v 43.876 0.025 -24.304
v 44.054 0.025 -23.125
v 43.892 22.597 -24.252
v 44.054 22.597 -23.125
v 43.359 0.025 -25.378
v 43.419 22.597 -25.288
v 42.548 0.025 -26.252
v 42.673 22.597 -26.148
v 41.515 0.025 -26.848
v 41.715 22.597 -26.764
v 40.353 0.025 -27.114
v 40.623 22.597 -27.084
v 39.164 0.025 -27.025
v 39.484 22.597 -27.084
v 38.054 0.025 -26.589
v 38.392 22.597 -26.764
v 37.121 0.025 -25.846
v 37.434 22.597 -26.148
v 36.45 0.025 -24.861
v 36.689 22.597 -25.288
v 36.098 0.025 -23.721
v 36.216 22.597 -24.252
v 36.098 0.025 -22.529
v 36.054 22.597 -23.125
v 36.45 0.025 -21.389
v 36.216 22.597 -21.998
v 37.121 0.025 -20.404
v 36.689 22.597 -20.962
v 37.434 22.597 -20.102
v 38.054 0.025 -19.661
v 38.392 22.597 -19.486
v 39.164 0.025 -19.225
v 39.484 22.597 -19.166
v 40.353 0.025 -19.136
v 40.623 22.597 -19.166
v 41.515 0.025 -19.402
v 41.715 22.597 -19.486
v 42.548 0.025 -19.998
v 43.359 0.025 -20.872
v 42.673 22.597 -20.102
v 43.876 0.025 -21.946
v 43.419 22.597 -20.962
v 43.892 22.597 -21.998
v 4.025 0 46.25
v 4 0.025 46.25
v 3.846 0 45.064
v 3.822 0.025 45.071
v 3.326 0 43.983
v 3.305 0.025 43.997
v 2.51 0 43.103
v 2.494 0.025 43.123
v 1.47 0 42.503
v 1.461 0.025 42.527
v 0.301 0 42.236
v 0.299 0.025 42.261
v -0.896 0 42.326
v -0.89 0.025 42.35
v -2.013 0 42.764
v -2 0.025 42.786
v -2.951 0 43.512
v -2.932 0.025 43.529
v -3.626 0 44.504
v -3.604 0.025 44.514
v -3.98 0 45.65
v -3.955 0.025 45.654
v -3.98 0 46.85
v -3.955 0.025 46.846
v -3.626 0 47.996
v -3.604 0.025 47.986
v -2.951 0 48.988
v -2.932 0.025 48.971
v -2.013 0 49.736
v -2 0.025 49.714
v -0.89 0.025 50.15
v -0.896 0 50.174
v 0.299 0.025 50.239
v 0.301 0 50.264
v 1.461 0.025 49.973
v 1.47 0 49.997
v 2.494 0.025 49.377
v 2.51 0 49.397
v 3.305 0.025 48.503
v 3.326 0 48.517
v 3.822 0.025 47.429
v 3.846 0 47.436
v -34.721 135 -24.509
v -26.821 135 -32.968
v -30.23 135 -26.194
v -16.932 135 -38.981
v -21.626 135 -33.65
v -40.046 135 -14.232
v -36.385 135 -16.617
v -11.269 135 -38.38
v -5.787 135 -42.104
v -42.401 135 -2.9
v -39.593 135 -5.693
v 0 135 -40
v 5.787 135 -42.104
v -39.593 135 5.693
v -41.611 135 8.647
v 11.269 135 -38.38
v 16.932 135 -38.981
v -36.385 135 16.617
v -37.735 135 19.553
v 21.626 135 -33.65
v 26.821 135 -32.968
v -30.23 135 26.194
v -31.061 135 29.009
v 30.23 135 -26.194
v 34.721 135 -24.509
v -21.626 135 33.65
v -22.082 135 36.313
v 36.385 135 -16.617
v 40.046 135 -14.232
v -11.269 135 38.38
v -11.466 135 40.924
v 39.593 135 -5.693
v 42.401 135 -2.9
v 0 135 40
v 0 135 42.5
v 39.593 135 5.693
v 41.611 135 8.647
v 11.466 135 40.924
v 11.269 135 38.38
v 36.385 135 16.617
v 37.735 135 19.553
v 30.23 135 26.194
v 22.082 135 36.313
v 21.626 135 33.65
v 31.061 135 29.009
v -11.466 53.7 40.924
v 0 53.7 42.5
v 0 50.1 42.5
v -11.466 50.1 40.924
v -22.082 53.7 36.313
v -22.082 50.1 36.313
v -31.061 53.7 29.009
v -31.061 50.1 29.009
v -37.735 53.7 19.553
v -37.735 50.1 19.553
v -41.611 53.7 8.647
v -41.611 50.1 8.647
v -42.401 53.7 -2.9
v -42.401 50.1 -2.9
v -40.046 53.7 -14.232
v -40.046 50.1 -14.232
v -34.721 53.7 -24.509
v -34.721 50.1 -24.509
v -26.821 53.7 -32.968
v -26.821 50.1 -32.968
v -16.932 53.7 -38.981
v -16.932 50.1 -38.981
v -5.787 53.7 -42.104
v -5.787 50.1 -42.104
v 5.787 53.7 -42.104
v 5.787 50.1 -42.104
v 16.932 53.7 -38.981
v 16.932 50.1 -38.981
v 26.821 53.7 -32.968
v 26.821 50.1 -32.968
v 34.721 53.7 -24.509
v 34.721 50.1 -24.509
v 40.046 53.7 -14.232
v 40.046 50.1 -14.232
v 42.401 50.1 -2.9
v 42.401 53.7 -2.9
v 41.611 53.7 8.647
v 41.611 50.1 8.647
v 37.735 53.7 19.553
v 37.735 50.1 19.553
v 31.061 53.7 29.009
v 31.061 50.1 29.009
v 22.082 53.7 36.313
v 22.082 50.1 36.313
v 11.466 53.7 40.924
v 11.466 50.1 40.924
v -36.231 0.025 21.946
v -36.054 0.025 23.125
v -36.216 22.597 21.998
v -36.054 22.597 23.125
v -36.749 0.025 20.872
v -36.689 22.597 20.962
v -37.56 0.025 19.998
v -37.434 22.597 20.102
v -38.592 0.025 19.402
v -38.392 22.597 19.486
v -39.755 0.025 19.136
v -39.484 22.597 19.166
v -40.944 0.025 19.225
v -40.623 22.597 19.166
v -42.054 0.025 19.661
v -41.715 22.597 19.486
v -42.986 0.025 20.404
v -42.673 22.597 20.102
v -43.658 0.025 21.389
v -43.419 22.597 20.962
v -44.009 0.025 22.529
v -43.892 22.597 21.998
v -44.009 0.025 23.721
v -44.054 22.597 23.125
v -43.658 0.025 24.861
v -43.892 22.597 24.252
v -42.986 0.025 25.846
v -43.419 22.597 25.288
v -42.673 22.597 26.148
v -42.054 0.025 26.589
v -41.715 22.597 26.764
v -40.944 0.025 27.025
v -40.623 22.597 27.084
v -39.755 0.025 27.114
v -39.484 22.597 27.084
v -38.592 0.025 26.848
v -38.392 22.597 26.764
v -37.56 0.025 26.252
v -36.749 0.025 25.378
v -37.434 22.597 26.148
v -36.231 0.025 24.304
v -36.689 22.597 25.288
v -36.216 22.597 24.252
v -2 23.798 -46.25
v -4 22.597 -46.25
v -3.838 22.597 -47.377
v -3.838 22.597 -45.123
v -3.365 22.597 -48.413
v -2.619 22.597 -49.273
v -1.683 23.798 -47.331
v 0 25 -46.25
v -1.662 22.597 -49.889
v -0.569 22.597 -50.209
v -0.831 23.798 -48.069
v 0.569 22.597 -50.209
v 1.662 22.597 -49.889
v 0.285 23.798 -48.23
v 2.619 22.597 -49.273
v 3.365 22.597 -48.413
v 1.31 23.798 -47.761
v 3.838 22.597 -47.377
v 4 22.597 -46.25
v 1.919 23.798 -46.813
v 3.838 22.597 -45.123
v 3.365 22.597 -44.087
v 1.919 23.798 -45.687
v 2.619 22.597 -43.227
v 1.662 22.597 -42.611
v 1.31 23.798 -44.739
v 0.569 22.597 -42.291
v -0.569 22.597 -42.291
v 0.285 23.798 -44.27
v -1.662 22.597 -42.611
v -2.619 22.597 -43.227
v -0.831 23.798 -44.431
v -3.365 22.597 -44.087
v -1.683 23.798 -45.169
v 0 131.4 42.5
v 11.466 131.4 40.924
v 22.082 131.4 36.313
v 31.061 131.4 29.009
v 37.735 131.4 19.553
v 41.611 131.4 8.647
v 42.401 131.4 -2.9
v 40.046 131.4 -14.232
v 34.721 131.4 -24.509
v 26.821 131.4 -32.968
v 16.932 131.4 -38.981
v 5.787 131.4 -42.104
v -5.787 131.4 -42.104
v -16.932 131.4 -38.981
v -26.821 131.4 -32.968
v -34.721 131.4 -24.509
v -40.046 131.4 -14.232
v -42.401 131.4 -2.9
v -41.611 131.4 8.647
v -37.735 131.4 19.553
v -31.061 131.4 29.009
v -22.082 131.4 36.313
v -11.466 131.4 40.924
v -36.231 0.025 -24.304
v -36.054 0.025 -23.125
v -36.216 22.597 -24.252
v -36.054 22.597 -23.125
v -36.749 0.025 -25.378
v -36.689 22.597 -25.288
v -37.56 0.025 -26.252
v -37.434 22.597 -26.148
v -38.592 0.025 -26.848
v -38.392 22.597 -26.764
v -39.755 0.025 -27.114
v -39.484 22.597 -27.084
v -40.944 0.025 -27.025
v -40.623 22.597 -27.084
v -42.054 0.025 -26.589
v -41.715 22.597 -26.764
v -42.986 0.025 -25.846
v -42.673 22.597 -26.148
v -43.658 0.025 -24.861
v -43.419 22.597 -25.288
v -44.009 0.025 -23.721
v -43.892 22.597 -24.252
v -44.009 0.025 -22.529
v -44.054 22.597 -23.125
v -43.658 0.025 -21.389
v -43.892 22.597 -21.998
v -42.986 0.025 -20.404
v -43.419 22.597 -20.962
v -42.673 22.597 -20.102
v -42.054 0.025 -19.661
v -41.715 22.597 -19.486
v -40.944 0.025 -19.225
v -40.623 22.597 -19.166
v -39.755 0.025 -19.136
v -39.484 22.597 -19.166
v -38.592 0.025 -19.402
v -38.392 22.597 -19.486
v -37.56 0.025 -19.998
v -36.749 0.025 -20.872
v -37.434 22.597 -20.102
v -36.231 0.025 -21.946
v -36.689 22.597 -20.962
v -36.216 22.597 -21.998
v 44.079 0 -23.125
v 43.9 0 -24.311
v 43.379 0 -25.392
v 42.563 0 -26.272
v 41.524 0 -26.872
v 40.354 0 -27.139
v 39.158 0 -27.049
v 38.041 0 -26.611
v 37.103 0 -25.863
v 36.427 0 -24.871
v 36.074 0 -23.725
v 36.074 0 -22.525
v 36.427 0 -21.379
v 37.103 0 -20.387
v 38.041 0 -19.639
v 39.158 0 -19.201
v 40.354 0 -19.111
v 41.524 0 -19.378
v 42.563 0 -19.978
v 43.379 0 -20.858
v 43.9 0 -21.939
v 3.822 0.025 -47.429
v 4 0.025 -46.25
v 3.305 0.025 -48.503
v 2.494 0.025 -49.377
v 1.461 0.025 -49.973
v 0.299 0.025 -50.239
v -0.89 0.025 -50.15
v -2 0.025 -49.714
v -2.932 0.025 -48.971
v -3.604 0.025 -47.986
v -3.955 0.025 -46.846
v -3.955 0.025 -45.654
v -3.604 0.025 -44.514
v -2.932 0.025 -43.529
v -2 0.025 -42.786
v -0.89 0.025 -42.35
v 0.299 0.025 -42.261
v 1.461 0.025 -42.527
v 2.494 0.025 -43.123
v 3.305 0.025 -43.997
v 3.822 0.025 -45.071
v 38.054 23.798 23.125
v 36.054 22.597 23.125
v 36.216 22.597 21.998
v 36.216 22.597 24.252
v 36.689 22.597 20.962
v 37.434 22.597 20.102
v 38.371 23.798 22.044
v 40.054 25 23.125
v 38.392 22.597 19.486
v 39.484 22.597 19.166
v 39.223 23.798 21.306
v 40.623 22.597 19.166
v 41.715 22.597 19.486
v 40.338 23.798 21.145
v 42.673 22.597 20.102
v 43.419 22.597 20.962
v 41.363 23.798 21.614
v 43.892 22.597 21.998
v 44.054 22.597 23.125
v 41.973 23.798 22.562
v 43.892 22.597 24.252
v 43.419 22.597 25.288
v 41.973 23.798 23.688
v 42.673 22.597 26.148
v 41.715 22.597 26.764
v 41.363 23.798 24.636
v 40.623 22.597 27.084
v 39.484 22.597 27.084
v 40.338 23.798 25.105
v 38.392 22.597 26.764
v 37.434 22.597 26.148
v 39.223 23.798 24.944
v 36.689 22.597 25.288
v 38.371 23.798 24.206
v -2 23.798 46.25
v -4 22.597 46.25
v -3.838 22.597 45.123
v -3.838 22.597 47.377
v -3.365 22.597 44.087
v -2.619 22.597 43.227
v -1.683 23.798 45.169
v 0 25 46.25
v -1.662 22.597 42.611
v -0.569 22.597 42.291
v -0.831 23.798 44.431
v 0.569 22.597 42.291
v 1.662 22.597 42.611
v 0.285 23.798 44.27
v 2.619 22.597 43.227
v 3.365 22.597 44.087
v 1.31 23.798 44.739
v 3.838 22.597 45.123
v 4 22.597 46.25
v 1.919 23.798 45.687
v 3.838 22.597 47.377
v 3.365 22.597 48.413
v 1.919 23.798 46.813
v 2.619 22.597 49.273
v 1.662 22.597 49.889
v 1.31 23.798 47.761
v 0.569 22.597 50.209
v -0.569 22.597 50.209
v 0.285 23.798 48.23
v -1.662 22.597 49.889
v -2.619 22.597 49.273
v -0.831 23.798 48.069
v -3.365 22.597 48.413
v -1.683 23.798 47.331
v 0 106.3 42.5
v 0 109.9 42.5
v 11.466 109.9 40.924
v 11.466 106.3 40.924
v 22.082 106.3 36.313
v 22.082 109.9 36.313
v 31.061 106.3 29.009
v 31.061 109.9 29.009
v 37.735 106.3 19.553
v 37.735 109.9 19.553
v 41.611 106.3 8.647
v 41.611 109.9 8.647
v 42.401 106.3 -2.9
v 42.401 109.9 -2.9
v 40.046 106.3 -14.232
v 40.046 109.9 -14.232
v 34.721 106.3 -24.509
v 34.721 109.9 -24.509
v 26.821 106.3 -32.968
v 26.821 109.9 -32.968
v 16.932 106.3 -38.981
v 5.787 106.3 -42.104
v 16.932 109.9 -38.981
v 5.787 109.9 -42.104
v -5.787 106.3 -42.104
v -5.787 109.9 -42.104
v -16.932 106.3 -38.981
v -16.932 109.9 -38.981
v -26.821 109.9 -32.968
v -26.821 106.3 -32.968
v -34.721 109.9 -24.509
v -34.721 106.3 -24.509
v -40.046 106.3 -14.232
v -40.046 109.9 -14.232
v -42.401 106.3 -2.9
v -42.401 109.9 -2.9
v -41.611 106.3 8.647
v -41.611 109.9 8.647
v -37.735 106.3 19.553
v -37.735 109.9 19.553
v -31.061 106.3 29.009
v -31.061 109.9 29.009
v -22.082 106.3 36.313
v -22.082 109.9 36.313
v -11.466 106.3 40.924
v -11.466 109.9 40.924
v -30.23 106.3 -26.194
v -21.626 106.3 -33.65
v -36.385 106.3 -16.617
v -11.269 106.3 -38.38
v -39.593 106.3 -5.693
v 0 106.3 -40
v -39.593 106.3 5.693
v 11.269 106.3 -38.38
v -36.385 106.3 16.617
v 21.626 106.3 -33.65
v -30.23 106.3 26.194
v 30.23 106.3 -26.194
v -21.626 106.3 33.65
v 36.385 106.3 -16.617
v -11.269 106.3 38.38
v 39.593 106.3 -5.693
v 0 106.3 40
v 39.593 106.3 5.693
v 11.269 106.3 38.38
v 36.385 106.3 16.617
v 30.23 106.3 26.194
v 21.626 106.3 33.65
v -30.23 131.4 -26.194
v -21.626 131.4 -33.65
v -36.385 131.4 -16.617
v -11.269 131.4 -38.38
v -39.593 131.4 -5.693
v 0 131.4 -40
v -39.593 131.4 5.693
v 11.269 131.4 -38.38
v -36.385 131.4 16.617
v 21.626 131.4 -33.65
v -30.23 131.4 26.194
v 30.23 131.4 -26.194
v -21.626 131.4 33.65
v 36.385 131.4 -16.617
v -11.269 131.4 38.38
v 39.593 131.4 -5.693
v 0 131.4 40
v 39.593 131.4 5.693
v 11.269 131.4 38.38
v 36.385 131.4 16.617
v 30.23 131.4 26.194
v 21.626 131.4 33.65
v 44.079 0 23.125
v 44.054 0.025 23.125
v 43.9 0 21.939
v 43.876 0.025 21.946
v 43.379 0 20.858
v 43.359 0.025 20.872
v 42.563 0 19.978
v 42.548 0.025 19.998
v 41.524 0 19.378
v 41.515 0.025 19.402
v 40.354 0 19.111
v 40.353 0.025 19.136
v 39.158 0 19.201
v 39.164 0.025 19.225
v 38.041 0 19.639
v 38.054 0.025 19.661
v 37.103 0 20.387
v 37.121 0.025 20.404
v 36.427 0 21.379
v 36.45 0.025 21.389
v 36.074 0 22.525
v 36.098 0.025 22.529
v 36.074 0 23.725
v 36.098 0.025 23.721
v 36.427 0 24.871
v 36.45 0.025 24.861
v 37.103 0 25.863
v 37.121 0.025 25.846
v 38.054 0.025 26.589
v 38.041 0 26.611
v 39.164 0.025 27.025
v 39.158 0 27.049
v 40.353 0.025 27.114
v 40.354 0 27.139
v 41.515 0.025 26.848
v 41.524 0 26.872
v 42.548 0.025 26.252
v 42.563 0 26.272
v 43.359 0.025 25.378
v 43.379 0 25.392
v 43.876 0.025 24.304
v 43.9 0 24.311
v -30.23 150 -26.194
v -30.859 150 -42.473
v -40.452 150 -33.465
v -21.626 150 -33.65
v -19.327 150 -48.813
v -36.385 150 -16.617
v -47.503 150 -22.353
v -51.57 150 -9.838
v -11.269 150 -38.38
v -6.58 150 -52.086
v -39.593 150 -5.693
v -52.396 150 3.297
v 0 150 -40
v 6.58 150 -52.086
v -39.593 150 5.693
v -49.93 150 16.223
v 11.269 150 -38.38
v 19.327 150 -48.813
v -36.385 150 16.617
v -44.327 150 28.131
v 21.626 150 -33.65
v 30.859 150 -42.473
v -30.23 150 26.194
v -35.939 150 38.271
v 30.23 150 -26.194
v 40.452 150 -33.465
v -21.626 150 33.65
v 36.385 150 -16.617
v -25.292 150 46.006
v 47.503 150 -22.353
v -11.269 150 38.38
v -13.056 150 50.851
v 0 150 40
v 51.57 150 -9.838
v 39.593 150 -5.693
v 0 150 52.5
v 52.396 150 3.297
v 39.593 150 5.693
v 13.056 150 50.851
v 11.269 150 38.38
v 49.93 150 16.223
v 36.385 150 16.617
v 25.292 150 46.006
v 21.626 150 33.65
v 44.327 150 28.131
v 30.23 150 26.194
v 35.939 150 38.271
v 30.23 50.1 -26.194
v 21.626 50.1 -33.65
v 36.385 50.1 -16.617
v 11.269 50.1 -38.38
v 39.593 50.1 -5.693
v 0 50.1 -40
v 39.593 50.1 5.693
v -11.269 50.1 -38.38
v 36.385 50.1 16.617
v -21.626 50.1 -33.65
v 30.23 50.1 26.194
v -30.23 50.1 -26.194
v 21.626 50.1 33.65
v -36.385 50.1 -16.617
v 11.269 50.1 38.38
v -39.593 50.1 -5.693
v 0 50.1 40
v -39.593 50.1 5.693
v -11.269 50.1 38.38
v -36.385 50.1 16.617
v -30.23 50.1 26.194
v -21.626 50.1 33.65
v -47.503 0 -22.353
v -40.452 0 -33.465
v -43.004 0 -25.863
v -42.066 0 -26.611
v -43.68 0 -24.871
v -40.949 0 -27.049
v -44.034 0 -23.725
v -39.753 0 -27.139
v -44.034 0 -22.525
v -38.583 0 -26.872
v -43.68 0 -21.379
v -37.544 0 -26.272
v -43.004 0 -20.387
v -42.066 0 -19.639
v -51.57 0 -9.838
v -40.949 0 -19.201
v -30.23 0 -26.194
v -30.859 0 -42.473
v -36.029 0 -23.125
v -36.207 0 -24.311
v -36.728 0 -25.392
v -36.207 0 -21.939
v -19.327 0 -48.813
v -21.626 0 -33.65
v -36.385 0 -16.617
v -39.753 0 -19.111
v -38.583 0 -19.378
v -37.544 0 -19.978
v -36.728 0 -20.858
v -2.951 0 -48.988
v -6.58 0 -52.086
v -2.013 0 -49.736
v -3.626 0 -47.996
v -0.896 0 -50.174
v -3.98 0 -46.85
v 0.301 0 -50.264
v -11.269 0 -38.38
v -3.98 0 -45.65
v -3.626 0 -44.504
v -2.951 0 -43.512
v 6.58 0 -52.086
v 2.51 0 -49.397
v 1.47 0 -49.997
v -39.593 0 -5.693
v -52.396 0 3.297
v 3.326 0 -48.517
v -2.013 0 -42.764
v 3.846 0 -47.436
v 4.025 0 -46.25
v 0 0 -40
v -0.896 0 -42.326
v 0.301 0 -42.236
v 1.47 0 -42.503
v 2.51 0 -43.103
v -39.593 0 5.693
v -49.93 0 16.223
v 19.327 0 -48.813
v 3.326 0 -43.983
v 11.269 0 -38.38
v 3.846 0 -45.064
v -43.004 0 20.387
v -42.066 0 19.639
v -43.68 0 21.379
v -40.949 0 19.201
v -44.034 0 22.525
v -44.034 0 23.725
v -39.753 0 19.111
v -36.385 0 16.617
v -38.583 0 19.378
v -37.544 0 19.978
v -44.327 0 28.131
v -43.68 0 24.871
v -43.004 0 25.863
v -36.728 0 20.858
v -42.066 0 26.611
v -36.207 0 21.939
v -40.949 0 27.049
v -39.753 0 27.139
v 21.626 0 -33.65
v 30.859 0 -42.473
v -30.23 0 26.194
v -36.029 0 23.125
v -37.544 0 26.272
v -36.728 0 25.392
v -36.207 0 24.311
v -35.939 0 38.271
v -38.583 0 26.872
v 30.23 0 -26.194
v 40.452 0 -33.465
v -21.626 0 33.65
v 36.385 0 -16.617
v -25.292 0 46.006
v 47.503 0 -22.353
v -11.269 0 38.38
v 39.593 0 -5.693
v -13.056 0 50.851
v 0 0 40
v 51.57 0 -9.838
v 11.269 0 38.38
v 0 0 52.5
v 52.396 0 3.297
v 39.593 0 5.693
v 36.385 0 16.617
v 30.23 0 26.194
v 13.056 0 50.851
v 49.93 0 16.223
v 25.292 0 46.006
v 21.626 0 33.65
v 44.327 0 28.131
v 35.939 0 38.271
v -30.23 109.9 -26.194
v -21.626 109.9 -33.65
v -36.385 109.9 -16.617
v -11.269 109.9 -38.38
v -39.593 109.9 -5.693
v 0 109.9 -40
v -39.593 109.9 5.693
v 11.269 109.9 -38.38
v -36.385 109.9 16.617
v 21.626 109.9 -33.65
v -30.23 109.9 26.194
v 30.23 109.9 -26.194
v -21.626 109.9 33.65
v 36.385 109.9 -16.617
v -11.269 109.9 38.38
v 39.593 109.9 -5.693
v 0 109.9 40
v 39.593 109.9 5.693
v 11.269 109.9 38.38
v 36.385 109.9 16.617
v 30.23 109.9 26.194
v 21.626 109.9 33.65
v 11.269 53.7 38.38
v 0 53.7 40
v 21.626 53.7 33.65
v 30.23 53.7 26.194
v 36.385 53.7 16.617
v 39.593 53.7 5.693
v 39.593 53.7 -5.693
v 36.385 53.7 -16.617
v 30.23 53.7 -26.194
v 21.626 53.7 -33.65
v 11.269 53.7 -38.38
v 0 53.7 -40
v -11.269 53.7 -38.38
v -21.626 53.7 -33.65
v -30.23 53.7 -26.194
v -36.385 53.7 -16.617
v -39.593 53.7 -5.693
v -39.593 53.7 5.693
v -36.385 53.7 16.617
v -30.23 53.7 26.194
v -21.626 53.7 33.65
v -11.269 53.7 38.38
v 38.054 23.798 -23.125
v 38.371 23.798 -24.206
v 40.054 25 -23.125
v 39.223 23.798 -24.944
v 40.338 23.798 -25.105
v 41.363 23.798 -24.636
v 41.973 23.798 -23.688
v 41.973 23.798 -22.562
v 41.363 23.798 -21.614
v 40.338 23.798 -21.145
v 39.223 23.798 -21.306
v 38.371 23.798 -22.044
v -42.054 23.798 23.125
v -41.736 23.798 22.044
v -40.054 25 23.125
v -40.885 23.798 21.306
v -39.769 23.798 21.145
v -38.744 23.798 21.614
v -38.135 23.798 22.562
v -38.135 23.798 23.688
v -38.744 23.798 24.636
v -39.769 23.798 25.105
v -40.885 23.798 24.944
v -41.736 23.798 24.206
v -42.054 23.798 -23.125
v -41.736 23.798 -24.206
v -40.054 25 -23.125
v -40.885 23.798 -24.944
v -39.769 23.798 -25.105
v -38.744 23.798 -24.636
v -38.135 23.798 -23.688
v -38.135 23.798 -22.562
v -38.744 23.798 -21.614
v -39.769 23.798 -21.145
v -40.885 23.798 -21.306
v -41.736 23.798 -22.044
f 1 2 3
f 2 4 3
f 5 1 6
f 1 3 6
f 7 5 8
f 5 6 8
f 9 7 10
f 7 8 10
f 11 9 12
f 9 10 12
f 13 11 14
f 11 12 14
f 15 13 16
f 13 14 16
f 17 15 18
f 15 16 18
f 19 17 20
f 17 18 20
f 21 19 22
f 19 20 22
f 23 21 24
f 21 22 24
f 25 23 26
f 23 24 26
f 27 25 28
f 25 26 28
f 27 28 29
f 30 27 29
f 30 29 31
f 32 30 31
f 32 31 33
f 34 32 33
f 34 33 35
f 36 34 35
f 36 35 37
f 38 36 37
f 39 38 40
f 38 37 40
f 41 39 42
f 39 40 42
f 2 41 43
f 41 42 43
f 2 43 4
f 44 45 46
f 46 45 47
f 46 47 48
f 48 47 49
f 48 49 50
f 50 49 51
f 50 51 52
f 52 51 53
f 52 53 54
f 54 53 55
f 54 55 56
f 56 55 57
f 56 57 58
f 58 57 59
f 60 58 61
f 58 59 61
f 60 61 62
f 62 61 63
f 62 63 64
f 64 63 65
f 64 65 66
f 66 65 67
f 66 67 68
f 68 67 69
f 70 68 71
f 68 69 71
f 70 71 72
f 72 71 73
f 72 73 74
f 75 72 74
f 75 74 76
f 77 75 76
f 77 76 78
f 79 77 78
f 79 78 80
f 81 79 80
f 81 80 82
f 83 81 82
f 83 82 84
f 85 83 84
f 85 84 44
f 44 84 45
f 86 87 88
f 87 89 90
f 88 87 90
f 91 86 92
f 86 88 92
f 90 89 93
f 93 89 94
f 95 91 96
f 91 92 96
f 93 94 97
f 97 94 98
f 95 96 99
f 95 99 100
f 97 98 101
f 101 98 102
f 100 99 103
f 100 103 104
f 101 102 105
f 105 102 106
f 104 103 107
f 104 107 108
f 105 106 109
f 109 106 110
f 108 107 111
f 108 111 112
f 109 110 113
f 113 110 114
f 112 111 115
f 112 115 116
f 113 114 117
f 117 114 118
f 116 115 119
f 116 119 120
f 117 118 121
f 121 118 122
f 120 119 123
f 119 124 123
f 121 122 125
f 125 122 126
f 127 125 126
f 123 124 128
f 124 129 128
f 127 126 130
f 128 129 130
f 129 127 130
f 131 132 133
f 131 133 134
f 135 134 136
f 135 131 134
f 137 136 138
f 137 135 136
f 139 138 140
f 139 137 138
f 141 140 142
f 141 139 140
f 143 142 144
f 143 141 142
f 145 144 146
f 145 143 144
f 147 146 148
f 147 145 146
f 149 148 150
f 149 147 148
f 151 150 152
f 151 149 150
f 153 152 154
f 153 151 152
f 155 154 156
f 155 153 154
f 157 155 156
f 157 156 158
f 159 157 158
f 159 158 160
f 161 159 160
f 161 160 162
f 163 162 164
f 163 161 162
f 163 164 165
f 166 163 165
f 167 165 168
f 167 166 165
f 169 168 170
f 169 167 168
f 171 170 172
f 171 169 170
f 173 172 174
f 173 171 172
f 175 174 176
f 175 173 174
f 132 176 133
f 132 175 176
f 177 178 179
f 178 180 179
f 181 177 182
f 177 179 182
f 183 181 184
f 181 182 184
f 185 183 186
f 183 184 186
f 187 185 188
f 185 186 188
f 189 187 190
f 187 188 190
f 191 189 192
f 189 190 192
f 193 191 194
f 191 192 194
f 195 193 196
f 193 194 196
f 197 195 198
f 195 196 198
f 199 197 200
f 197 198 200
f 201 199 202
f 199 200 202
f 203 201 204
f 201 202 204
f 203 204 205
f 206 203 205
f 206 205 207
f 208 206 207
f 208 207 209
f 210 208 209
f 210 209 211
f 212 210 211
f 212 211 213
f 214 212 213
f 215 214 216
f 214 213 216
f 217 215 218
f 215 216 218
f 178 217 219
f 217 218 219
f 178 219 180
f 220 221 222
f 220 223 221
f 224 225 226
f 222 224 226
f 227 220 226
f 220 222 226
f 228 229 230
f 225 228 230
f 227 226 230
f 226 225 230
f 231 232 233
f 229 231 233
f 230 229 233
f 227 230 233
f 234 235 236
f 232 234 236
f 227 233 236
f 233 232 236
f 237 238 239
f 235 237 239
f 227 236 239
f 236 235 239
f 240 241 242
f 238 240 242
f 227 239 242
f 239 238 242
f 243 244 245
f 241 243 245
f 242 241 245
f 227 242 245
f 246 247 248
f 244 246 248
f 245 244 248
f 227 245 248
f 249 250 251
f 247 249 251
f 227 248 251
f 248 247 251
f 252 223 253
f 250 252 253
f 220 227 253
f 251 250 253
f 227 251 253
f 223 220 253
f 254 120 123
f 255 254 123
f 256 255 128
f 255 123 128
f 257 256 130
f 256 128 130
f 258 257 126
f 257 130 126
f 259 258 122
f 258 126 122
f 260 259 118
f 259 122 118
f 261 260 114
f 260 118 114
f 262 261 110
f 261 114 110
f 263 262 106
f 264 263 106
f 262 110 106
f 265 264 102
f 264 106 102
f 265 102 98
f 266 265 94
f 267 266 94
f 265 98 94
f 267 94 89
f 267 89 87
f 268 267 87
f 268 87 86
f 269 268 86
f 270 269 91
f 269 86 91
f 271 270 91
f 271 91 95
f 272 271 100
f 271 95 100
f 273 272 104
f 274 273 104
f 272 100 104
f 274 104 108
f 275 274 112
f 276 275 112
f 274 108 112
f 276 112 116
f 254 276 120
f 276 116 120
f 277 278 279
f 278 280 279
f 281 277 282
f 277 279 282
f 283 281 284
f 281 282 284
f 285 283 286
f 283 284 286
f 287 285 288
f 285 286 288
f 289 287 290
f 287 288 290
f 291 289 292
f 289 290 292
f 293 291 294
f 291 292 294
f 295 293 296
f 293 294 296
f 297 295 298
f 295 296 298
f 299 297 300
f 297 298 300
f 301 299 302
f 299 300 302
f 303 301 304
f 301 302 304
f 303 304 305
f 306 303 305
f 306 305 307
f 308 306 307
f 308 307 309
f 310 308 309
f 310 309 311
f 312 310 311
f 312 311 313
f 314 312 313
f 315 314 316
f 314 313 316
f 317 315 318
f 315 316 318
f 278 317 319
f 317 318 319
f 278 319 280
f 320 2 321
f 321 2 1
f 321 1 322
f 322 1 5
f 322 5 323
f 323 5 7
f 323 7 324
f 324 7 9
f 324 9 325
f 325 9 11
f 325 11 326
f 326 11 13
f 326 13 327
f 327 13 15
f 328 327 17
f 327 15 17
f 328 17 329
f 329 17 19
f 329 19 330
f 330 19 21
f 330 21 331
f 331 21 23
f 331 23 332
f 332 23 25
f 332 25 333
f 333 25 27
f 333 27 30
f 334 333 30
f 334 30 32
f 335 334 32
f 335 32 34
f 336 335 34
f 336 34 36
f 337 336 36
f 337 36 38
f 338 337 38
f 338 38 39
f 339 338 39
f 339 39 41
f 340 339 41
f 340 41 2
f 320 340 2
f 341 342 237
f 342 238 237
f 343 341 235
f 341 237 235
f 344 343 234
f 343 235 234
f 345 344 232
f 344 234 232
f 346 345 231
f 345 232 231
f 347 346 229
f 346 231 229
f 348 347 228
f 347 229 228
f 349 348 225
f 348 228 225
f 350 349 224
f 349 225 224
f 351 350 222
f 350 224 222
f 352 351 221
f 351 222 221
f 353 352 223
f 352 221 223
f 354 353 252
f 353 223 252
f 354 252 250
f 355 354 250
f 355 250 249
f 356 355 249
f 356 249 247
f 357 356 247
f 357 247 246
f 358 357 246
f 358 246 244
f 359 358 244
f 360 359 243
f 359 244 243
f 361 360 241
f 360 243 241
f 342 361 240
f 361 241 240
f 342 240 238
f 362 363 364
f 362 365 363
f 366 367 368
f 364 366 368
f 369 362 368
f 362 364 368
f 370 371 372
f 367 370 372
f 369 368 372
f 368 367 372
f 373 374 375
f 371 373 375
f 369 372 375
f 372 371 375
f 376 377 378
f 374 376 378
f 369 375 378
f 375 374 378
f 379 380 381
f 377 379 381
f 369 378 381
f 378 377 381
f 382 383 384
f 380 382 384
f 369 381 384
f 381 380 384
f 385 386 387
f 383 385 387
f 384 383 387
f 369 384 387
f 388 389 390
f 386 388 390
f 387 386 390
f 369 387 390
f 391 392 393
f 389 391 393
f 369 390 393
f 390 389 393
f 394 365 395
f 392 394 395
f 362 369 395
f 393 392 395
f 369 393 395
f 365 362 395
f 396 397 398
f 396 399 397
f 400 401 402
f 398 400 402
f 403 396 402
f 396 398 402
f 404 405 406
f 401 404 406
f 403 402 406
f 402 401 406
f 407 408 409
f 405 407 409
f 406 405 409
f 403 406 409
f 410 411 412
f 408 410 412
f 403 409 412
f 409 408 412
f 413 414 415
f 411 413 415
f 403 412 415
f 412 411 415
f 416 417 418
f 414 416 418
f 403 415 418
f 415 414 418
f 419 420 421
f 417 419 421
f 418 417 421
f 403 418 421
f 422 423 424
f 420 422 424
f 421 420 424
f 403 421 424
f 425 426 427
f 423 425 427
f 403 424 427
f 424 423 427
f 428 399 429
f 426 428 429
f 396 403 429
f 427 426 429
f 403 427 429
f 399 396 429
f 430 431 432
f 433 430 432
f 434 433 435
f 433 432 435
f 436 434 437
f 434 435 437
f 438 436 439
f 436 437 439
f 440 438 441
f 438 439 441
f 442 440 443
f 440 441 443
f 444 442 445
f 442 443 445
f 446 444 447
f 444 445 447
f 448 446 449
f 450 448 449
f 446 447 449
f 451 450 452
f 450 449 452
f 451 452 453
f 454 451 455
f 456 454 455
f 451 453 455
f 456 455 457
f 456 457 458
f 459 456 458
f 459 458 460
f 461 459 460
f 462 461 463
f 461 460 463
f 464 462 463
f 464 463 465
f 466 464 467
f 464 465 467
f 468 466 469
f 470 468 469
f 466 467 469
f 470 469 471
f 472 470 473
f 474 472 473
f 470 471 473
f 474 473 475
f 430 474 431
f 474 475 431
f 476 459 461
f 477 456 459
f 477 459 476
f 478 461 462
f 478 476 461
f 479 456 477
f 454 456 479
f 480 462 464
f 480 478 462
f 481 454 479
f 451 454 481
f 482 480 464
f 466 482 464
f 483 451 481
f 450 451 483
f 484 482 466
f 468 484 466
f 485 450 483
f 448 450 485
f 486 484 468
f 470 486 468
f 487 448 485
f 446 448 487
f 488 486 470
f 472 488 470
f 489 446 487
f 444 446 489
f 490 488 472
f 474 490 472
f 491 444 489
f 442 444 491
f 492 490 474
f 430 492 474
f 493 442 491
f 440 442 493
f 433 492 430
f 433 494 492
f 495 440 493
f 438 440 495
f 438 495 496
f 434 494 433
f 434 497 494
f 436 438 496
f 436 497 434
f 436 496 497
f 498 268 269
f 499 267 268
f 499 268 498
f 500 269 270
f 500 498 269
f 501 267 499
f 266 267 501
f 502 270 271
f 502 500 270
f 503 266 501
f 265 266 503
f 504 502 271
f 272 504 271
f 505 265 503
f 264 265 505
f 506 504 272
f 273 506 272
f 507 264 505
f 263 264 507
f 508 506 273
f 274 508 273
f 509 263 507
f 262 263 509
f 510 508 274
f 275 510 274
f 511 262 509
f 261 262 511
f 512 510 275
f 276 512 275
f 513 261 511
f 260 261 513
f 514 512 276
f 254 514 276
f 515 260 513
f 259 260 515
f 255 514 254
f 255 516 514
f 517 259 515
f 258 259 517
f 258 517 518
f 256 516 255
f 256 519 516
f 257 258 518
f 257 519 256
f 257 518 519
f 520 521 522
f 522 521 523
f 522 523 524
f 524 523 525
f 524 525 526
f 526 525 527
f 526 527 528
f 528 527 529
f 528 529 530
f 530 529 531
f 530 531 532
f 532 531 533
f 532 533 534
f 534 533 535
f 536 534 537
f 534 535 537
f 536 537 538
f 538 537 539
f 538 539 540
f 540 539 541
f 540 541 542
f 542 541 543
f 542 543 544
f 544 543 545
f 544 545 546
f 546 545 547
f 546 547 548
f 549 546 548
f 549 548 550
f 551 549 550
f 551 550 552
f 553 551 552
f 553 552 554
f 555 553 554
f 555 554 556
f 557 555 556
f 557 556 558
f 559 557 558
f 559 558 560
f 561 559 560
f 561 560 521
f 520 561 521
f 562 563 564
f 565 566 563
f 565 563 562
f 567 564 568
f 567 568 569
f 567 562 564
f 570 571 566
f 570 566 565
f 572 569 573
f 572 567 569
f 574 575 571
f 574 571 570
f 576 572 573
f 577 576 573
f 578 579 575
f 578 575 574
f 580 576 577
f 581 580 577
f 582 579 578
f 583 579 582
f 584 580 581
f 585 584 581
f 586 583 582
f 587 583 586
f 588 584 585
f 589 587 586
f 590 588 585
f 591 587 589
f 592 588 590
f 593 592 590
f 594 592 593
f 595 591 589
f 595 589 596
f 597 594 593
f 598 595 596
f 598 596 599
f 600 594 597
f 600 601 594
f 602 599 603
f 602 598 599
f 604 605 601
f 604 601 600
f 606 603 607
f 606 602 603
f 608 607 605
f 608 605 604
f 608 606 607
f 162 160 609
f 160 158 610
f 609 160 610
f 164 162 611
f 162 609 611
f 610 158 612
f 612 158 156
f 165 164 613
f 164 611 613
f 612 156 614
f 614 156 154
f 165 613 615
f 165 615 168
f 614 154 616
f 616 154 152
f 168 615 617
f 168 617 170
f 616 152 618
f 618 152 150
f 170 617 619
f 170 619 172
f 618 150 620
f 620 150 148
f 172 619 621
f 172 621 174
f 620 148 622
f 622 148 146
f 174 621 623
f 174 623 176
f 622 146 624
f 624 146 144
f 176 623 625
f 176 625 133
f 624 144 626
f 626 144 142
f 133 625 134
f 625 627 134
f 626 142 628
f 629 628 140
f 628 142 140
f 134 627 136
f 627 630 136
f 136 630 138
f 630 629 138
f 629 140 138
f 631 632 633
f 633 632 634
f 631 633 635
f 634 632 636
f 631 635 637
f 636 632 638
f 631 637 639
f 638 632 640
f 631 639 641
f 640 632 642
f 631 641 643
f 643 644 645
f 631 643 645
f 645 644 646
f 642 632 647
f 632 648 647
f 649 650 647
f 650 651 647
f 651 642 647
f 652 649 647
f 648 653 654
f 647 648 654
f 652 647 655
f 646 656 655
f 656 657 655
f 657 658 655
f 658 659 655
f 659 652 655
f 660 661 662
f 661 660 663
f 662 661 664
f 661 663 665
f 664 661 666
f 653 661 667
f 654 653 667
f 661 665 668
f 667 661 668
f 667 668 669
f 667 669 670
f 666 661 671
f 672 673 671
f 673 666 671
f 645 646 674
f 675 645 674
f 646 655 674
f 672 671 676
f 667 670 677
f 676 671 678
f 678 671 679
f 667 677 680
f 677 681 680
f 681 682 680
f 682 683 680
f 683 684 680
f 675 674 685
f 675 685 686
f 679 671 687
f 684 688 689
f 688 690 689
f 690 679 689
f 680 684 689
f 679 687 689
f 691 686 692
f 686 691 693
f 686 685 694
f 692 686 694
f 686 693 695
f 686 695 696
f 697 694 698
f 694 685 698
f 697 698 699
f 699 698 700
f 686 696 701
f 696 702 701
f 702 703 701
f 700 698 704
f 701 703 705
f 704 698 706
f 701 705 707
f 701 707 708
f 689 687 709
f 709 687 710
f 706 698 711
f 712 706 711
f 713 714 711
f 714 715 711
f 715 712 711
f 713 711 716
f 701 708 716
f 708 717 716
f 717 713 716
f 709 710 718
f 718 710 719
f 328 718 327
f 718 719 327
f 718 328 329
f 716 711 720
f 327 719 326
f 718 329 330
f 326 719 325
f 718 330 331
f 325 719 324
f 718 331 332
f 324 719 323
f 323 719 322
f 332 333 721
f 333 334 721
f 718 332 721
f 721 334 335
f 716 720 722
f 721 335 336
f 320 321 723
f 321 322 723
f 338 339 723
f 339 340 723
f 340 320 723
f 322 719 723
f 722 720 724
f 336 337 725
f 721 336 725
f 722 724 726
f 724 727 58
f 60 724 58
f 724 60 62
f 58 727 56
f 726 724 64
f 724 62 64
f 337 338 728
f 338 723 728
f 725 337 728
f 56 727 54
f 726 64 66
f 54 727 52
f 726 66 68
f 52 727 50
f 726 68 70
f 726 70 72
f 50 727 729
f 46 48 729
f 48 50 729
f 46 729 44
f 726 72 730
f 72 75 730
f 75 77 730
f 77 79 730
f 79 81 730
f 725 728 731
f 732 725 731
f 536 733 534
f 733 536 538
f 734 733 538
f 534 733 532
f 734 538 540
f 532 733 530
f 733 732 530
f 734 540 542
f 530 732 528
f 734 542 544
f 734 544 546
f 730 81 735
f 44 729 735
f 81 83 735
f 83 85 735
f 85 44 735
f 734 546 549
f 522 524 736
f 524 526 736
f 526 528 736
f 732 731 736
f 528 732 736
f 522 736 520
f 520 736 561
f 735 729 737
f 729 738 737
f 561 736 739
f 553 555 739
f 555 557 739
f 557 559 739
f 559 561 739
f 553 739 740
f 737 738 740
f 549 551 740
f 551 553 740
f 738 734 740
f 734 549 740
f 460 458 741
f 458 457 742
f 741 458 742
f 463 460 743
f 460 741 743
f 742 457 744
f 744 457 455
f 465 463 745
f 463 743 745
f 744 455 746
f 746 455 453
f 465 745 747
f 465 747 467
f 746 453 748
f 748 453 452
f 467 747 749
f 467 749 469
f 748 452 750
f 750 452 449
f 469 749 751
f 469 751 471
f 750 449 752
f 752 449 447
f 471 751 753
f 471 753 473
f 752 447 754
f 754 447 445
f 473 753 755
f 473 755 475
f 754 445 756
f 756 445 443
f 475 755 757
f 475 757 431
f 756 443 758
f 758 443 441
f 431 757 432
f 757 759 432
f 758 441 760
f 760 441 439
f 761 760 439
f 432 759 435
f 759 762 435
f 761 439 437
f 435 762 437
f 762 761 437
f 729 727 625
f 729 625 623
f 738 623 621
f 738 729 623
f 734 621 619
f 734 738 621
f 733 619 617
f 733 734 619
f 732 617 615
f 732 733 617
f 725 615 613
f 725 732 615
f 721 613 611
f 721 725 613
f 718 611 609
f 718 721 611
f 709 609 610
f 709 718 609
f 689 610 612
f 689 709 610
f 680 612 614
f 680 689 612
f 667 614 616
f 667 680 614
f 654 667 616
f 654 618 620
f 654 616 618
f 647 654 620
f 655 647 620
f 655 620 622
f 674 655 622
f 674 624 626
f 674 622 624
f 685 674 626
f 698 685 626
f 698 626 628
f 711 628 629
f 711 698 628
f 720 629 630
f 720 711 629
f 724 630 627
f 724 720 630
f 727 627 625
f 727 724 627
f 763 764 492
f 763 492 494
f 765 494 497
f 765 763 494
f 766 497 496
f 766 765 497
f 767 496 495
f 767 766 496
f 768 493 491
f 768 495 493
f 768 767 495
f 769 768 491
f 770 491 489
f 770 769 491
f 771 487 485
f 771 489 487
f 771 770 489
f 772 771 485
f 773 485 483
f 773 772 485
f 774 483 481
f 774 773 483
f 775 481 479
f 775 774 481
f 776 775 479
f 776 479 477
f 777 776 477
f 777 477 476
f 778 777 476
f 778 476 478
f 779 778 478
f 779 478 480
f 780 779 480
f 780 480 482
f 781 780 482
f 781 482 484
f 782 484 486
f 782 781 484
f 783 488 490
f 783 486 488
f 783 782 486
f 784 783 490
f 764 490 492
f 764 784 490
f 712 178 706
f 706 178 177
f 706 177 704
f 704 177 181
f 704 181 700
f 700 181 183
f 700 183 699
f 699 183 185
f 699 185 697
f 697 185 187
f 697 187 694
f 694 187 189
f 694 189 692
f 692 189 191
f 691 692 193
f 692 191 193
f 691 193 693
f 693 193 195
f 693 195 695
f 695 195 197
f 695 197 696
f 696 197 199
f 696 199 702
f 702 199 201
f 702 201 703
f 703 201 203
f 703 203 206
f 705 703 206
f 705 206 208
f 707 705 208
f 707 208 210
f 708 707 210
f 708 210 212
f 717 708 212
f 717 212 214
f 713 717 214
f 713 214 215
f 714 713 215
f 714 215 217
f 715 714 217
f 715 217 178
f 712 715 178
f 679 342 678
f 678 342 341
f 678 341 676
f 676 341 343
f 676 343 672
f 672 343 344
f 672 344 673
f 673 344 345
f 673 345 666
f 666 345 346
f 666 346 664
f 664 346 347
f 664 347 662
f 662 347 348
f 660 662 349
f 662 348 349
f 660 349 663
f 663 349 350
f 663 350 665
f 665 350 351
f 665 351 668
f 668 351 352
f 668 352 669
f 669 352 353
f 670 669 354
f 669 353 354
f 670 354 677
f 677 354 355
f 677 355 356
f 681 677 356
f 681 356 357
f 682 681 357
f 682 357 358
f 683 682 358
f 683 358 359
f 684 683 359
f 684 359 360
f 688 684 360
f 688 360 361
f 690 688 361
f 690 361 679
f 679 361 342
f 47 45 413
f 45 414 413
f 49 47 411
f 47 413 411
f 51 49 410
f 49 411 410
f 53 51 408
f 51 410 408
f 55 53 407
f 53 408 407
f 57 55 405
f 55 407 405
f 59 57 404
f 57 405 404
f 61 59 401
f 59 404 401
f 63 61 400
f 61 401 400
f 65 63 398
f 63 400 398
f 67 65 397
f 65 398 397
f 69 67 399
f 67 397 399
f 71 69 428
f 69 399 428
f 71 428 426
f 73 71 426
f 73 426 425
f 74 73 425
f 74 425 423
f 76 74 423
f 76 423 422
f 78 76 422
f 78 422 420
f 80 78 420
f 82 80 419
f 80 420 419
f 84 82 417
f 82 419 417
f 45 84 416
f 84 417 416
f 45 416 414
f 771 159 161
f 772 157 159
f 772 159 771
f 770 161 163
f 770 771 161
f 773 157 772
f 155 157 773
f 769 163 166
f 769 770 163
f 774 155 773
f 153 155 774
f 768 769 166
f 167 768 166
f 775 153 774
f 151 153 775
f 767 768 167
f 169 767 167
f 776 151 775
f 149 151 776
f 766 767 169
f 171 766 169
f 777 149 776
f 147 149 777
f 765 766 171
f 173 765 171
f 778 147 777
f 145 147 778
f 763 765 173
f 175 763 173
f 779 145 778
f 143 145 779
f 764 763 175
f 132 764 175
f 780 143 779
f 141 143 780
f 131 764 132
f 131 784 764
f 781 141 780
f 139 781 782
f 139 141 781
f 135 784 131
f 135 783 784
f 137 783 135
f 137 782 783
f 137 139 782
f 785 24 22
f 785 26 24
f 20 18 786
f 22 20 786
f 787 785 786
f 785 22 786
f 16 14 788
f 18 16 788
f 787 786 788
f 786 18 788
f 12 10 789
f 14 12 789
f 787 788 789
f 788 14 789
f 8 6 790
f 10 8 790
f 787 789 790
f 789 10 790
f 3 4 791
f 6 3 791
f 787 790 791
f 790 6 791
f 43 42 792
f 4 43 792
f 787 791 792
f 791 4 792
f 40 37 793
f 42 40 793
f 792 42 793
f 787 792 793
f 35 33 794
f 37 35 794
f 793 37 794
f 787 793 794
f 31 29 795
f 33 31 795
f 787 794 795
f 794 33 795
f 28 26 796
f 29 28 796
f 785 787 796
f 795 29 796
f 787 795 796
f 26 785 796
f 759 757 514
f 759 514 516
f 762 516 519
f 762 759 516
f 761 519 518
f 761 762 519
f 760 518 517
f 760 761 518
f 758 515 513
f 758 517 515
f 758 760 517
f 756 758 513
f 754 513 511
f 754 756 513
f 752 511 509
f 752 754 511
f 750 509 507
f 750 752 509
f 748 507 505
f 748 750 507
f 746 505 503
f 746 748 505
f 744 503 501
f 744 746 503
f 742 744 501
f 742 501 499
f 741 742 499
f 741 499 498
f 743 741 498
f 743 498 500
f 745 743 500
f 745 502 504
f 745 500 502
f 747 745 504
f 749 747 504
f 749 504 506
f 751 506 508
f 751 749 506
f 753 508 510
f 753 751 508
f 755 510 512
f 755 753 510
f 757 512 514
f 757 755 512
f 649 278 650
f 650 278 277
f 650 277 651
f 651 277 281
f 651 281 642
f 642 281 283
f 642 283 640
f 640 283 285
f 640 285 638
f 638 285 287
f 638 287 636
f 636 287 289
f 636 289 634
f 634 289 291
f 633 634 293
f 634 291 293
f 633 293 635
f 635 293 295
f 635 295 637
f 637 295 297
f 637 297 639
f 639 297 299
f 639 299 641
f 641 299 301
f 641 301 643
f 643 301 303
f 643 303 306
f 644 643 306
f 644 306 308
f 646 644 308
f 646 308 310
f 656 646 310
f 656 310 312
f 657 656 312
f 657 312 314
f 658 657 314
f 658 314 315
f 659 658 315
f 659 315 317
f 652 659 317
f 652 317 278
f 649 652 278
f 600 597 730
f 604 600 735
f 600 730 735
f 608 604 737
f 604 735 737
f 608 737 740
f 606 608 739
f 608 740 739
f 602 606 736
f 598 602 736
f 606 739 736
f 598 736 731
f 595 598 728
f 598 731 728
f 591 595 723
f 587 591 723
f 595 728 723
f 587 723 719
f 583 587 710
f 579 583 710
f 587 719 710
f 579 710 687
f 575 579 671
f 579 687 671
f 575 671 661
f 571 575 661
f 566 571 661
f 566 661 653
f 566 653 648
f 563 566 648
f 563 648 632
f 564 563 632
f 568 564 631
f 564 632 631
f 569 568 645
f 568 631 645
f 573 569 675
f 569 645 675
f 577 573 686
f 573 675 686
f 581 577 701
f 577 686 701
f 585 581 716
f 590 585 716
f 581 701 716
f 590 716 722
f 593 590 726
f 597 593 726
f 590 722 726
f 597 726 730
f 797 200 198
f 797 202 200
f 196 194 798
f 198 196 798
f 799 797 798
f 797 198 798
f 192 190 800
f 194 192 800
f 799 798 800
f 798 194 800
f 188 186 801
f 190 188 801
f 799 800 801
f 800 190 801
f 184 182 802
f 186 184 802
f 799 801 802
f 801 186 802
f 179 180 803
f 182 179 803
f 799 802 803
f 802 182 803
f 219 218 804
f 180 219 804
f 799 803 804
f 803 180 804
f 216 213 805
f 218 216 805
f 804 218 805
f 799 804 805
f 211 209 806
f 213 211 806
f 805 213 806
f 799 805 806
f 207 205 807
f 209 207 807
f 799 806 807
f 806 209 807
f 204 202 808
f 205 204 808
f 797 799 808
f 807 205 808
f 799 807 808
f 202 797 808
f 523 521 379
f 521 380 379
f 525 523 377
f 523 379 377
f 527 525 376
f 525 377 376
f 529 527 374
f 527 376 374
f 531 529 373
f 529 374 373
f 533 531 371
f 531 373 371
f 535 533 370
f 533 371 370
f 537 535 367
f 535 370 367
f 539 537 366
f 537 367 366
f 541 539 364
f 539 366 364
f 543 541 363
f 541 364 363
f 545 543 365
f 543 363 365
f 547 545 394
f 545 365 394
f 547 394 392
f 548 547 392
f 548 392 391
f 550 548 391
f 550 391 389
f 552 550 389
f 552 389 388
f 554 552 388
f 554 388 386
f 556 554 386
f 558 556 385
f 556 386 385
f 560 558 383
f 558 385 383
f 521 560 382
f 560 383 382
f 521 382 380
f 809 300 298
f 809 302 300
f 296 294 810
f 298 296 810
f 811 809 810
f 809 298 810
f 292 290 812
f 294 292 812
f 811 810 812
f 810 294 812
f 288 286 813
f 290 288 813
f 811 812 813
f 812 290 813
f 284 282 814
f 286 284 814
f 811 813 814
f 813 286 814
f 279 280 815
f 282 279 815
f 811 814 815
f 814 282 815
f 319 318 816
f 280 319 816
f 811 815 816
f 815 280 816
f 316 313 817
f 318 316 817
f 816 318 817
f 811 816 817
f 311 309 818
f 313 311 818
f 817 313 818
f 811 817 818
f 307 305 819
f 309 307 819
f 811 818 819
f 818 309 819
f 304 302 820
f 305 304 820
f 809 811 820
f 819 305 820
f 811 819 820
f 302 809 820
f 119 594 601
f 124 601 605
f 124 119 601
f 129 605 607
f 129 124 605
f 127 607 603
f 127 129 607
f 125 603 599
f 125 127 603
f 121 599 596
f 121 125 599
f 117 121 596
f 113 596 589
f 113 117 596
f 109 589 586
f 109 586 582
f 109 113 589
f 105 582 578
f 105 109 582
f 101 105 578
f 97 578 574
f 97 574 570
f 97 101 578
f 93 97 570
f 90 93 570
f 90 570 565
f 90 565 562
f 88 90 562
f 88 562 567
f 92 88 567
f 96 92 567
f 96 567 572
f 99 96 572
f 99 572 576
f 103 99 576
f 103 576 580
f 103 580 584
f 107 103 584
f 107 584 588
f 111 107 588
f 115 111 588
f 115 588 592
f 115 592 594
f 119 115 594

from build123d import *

# Parameters (mm, degrees)
SKETCH1_R                       = 52.5
SKETCH1_R_2                     = 40
BOSS_EXTRUDE1_DEPTH             = 150
SKETCH7_R                       = 42.5
YLIN_URA_DEPTH                  = 3.6
SKETCH8_R                       = 42.5
TOKA_YLIN_URA_DEPTH             = 3.6
CUT_EXTRUDE5_START              = -3.6
SKETCH10_R                      = 42.5
CUT_EXTRUDE5_DEPTH              = 3.6
F_8_0MM_DOWEL_HOLE1_D           = 8
F_8_0MM_DOWEL_HOLE1_DEPTH       = 22.596557524
F_8_0MM_DOWEL_HOLE1_CSINK_D     = 8.05
F_8_0MM_DOWEL_HOLE1_CSINK_ANGLE = 90
F_8_0MM_DOWEL_HOLE1_TIP         = 2.403442476


with BuildPart() as part:
    # Sketch1 → Boss-Extrude1 (new body)
    with BuildSketch(Plane(origin=(0, 0, 0), x_dir=(1, 0, 0), z_dir=(0, 1, 0))):
        with Locations(Location((0, 0, 0), (0, 0, 270))):
            Circle(SKETCH1_R)
        with Locations(Location((0, 0, 0), (0, 0, 270))):
            Circle(SKETCH1_R_2, mode=Mode.SUBTRACT)
    extrude(amount=BOSS_EXTRUDE1_DEPTH)

    # Sketch7 → Ylin ura (cut)
    with BuildSketch(Plane(origin=(0, 135, 0), x_dir=(1, 0, 0), z_dir=(0, 1, 0))):
        with Locations(Location((0, 0, 0), (0, 0, 270))):
            Circle(SKETCH7_R)
    extrude(amount=-YLIN_URA_DEPTH, mode=Mode.SUBTRACT)

    # Sketch8 → Toka ylin ura (cut)
    with BuildSketch(Plane(origin=(0, 109.9, 0), x_dir=(1, 0, 0), z_dir=(0, 1, 0))):
        with Locations(Location((0, 0, 0), (0, 0, 270))):
            Circle(SKETCH8_R)
    extrude(amount=-TOKA_YLIN_URA_DEPTH, mode=Mode.SUBTRACT)

    # Sketch10 → Cut-Extrude5 (cut)
    with BuildSketch(Plane(origin=(0, 50.1, 0), x_dir=(-1, 0, 0), z_dir=(0, -1, 0)).offset(CUT_EXTRUDE5_START)):
        with Locations(Location((0, 0, 0), (0, 0, 270))):
            Circle(SKETCH10_R)
    extrude(amount=CUT_EXTRUDE5_DEPTH, mode=Mode.SUBTRACT)

    # Ø8.0mm Dowel Hole1
    with Locations(Plane(origin=(0, 0, 0), x_dir=(-1, 0, 0), z_dir=(0, -1, 0))):
        with Locations((0, -46.25), (-40.053674925, -23.125), (-40.053674925, 23.125), (0, 46.25), (40.053674925, 23.125), (40.053674925, -23.125)):
            CounterSinkHole(F_8_0MM_DOWEL_HOLE1_D / 2, F_8_0MM_DOWEL_HOLE1_CSINK_D / 2, depth=F_8_0MM_DOWEL_HOLE1_DEPTH, counter_sink_angle=F_8_0MM_DOWEL_HOLE1_CSINK_ANGLE)
            with Locations((0, 0, -(F_8_0MM_DOWEL_HOLE1_DEPTH + F_8_0MM_DOWEL_HOLE1_TIP / 2))):  # 118° drill point
                Cone(0, F_8_0MM_DOWEL_HOLE1_D / 2, F_8_0MM_DOWEL_HOLE1_TIP, mode=Mode.SUBTRACT)


solid = part.part
